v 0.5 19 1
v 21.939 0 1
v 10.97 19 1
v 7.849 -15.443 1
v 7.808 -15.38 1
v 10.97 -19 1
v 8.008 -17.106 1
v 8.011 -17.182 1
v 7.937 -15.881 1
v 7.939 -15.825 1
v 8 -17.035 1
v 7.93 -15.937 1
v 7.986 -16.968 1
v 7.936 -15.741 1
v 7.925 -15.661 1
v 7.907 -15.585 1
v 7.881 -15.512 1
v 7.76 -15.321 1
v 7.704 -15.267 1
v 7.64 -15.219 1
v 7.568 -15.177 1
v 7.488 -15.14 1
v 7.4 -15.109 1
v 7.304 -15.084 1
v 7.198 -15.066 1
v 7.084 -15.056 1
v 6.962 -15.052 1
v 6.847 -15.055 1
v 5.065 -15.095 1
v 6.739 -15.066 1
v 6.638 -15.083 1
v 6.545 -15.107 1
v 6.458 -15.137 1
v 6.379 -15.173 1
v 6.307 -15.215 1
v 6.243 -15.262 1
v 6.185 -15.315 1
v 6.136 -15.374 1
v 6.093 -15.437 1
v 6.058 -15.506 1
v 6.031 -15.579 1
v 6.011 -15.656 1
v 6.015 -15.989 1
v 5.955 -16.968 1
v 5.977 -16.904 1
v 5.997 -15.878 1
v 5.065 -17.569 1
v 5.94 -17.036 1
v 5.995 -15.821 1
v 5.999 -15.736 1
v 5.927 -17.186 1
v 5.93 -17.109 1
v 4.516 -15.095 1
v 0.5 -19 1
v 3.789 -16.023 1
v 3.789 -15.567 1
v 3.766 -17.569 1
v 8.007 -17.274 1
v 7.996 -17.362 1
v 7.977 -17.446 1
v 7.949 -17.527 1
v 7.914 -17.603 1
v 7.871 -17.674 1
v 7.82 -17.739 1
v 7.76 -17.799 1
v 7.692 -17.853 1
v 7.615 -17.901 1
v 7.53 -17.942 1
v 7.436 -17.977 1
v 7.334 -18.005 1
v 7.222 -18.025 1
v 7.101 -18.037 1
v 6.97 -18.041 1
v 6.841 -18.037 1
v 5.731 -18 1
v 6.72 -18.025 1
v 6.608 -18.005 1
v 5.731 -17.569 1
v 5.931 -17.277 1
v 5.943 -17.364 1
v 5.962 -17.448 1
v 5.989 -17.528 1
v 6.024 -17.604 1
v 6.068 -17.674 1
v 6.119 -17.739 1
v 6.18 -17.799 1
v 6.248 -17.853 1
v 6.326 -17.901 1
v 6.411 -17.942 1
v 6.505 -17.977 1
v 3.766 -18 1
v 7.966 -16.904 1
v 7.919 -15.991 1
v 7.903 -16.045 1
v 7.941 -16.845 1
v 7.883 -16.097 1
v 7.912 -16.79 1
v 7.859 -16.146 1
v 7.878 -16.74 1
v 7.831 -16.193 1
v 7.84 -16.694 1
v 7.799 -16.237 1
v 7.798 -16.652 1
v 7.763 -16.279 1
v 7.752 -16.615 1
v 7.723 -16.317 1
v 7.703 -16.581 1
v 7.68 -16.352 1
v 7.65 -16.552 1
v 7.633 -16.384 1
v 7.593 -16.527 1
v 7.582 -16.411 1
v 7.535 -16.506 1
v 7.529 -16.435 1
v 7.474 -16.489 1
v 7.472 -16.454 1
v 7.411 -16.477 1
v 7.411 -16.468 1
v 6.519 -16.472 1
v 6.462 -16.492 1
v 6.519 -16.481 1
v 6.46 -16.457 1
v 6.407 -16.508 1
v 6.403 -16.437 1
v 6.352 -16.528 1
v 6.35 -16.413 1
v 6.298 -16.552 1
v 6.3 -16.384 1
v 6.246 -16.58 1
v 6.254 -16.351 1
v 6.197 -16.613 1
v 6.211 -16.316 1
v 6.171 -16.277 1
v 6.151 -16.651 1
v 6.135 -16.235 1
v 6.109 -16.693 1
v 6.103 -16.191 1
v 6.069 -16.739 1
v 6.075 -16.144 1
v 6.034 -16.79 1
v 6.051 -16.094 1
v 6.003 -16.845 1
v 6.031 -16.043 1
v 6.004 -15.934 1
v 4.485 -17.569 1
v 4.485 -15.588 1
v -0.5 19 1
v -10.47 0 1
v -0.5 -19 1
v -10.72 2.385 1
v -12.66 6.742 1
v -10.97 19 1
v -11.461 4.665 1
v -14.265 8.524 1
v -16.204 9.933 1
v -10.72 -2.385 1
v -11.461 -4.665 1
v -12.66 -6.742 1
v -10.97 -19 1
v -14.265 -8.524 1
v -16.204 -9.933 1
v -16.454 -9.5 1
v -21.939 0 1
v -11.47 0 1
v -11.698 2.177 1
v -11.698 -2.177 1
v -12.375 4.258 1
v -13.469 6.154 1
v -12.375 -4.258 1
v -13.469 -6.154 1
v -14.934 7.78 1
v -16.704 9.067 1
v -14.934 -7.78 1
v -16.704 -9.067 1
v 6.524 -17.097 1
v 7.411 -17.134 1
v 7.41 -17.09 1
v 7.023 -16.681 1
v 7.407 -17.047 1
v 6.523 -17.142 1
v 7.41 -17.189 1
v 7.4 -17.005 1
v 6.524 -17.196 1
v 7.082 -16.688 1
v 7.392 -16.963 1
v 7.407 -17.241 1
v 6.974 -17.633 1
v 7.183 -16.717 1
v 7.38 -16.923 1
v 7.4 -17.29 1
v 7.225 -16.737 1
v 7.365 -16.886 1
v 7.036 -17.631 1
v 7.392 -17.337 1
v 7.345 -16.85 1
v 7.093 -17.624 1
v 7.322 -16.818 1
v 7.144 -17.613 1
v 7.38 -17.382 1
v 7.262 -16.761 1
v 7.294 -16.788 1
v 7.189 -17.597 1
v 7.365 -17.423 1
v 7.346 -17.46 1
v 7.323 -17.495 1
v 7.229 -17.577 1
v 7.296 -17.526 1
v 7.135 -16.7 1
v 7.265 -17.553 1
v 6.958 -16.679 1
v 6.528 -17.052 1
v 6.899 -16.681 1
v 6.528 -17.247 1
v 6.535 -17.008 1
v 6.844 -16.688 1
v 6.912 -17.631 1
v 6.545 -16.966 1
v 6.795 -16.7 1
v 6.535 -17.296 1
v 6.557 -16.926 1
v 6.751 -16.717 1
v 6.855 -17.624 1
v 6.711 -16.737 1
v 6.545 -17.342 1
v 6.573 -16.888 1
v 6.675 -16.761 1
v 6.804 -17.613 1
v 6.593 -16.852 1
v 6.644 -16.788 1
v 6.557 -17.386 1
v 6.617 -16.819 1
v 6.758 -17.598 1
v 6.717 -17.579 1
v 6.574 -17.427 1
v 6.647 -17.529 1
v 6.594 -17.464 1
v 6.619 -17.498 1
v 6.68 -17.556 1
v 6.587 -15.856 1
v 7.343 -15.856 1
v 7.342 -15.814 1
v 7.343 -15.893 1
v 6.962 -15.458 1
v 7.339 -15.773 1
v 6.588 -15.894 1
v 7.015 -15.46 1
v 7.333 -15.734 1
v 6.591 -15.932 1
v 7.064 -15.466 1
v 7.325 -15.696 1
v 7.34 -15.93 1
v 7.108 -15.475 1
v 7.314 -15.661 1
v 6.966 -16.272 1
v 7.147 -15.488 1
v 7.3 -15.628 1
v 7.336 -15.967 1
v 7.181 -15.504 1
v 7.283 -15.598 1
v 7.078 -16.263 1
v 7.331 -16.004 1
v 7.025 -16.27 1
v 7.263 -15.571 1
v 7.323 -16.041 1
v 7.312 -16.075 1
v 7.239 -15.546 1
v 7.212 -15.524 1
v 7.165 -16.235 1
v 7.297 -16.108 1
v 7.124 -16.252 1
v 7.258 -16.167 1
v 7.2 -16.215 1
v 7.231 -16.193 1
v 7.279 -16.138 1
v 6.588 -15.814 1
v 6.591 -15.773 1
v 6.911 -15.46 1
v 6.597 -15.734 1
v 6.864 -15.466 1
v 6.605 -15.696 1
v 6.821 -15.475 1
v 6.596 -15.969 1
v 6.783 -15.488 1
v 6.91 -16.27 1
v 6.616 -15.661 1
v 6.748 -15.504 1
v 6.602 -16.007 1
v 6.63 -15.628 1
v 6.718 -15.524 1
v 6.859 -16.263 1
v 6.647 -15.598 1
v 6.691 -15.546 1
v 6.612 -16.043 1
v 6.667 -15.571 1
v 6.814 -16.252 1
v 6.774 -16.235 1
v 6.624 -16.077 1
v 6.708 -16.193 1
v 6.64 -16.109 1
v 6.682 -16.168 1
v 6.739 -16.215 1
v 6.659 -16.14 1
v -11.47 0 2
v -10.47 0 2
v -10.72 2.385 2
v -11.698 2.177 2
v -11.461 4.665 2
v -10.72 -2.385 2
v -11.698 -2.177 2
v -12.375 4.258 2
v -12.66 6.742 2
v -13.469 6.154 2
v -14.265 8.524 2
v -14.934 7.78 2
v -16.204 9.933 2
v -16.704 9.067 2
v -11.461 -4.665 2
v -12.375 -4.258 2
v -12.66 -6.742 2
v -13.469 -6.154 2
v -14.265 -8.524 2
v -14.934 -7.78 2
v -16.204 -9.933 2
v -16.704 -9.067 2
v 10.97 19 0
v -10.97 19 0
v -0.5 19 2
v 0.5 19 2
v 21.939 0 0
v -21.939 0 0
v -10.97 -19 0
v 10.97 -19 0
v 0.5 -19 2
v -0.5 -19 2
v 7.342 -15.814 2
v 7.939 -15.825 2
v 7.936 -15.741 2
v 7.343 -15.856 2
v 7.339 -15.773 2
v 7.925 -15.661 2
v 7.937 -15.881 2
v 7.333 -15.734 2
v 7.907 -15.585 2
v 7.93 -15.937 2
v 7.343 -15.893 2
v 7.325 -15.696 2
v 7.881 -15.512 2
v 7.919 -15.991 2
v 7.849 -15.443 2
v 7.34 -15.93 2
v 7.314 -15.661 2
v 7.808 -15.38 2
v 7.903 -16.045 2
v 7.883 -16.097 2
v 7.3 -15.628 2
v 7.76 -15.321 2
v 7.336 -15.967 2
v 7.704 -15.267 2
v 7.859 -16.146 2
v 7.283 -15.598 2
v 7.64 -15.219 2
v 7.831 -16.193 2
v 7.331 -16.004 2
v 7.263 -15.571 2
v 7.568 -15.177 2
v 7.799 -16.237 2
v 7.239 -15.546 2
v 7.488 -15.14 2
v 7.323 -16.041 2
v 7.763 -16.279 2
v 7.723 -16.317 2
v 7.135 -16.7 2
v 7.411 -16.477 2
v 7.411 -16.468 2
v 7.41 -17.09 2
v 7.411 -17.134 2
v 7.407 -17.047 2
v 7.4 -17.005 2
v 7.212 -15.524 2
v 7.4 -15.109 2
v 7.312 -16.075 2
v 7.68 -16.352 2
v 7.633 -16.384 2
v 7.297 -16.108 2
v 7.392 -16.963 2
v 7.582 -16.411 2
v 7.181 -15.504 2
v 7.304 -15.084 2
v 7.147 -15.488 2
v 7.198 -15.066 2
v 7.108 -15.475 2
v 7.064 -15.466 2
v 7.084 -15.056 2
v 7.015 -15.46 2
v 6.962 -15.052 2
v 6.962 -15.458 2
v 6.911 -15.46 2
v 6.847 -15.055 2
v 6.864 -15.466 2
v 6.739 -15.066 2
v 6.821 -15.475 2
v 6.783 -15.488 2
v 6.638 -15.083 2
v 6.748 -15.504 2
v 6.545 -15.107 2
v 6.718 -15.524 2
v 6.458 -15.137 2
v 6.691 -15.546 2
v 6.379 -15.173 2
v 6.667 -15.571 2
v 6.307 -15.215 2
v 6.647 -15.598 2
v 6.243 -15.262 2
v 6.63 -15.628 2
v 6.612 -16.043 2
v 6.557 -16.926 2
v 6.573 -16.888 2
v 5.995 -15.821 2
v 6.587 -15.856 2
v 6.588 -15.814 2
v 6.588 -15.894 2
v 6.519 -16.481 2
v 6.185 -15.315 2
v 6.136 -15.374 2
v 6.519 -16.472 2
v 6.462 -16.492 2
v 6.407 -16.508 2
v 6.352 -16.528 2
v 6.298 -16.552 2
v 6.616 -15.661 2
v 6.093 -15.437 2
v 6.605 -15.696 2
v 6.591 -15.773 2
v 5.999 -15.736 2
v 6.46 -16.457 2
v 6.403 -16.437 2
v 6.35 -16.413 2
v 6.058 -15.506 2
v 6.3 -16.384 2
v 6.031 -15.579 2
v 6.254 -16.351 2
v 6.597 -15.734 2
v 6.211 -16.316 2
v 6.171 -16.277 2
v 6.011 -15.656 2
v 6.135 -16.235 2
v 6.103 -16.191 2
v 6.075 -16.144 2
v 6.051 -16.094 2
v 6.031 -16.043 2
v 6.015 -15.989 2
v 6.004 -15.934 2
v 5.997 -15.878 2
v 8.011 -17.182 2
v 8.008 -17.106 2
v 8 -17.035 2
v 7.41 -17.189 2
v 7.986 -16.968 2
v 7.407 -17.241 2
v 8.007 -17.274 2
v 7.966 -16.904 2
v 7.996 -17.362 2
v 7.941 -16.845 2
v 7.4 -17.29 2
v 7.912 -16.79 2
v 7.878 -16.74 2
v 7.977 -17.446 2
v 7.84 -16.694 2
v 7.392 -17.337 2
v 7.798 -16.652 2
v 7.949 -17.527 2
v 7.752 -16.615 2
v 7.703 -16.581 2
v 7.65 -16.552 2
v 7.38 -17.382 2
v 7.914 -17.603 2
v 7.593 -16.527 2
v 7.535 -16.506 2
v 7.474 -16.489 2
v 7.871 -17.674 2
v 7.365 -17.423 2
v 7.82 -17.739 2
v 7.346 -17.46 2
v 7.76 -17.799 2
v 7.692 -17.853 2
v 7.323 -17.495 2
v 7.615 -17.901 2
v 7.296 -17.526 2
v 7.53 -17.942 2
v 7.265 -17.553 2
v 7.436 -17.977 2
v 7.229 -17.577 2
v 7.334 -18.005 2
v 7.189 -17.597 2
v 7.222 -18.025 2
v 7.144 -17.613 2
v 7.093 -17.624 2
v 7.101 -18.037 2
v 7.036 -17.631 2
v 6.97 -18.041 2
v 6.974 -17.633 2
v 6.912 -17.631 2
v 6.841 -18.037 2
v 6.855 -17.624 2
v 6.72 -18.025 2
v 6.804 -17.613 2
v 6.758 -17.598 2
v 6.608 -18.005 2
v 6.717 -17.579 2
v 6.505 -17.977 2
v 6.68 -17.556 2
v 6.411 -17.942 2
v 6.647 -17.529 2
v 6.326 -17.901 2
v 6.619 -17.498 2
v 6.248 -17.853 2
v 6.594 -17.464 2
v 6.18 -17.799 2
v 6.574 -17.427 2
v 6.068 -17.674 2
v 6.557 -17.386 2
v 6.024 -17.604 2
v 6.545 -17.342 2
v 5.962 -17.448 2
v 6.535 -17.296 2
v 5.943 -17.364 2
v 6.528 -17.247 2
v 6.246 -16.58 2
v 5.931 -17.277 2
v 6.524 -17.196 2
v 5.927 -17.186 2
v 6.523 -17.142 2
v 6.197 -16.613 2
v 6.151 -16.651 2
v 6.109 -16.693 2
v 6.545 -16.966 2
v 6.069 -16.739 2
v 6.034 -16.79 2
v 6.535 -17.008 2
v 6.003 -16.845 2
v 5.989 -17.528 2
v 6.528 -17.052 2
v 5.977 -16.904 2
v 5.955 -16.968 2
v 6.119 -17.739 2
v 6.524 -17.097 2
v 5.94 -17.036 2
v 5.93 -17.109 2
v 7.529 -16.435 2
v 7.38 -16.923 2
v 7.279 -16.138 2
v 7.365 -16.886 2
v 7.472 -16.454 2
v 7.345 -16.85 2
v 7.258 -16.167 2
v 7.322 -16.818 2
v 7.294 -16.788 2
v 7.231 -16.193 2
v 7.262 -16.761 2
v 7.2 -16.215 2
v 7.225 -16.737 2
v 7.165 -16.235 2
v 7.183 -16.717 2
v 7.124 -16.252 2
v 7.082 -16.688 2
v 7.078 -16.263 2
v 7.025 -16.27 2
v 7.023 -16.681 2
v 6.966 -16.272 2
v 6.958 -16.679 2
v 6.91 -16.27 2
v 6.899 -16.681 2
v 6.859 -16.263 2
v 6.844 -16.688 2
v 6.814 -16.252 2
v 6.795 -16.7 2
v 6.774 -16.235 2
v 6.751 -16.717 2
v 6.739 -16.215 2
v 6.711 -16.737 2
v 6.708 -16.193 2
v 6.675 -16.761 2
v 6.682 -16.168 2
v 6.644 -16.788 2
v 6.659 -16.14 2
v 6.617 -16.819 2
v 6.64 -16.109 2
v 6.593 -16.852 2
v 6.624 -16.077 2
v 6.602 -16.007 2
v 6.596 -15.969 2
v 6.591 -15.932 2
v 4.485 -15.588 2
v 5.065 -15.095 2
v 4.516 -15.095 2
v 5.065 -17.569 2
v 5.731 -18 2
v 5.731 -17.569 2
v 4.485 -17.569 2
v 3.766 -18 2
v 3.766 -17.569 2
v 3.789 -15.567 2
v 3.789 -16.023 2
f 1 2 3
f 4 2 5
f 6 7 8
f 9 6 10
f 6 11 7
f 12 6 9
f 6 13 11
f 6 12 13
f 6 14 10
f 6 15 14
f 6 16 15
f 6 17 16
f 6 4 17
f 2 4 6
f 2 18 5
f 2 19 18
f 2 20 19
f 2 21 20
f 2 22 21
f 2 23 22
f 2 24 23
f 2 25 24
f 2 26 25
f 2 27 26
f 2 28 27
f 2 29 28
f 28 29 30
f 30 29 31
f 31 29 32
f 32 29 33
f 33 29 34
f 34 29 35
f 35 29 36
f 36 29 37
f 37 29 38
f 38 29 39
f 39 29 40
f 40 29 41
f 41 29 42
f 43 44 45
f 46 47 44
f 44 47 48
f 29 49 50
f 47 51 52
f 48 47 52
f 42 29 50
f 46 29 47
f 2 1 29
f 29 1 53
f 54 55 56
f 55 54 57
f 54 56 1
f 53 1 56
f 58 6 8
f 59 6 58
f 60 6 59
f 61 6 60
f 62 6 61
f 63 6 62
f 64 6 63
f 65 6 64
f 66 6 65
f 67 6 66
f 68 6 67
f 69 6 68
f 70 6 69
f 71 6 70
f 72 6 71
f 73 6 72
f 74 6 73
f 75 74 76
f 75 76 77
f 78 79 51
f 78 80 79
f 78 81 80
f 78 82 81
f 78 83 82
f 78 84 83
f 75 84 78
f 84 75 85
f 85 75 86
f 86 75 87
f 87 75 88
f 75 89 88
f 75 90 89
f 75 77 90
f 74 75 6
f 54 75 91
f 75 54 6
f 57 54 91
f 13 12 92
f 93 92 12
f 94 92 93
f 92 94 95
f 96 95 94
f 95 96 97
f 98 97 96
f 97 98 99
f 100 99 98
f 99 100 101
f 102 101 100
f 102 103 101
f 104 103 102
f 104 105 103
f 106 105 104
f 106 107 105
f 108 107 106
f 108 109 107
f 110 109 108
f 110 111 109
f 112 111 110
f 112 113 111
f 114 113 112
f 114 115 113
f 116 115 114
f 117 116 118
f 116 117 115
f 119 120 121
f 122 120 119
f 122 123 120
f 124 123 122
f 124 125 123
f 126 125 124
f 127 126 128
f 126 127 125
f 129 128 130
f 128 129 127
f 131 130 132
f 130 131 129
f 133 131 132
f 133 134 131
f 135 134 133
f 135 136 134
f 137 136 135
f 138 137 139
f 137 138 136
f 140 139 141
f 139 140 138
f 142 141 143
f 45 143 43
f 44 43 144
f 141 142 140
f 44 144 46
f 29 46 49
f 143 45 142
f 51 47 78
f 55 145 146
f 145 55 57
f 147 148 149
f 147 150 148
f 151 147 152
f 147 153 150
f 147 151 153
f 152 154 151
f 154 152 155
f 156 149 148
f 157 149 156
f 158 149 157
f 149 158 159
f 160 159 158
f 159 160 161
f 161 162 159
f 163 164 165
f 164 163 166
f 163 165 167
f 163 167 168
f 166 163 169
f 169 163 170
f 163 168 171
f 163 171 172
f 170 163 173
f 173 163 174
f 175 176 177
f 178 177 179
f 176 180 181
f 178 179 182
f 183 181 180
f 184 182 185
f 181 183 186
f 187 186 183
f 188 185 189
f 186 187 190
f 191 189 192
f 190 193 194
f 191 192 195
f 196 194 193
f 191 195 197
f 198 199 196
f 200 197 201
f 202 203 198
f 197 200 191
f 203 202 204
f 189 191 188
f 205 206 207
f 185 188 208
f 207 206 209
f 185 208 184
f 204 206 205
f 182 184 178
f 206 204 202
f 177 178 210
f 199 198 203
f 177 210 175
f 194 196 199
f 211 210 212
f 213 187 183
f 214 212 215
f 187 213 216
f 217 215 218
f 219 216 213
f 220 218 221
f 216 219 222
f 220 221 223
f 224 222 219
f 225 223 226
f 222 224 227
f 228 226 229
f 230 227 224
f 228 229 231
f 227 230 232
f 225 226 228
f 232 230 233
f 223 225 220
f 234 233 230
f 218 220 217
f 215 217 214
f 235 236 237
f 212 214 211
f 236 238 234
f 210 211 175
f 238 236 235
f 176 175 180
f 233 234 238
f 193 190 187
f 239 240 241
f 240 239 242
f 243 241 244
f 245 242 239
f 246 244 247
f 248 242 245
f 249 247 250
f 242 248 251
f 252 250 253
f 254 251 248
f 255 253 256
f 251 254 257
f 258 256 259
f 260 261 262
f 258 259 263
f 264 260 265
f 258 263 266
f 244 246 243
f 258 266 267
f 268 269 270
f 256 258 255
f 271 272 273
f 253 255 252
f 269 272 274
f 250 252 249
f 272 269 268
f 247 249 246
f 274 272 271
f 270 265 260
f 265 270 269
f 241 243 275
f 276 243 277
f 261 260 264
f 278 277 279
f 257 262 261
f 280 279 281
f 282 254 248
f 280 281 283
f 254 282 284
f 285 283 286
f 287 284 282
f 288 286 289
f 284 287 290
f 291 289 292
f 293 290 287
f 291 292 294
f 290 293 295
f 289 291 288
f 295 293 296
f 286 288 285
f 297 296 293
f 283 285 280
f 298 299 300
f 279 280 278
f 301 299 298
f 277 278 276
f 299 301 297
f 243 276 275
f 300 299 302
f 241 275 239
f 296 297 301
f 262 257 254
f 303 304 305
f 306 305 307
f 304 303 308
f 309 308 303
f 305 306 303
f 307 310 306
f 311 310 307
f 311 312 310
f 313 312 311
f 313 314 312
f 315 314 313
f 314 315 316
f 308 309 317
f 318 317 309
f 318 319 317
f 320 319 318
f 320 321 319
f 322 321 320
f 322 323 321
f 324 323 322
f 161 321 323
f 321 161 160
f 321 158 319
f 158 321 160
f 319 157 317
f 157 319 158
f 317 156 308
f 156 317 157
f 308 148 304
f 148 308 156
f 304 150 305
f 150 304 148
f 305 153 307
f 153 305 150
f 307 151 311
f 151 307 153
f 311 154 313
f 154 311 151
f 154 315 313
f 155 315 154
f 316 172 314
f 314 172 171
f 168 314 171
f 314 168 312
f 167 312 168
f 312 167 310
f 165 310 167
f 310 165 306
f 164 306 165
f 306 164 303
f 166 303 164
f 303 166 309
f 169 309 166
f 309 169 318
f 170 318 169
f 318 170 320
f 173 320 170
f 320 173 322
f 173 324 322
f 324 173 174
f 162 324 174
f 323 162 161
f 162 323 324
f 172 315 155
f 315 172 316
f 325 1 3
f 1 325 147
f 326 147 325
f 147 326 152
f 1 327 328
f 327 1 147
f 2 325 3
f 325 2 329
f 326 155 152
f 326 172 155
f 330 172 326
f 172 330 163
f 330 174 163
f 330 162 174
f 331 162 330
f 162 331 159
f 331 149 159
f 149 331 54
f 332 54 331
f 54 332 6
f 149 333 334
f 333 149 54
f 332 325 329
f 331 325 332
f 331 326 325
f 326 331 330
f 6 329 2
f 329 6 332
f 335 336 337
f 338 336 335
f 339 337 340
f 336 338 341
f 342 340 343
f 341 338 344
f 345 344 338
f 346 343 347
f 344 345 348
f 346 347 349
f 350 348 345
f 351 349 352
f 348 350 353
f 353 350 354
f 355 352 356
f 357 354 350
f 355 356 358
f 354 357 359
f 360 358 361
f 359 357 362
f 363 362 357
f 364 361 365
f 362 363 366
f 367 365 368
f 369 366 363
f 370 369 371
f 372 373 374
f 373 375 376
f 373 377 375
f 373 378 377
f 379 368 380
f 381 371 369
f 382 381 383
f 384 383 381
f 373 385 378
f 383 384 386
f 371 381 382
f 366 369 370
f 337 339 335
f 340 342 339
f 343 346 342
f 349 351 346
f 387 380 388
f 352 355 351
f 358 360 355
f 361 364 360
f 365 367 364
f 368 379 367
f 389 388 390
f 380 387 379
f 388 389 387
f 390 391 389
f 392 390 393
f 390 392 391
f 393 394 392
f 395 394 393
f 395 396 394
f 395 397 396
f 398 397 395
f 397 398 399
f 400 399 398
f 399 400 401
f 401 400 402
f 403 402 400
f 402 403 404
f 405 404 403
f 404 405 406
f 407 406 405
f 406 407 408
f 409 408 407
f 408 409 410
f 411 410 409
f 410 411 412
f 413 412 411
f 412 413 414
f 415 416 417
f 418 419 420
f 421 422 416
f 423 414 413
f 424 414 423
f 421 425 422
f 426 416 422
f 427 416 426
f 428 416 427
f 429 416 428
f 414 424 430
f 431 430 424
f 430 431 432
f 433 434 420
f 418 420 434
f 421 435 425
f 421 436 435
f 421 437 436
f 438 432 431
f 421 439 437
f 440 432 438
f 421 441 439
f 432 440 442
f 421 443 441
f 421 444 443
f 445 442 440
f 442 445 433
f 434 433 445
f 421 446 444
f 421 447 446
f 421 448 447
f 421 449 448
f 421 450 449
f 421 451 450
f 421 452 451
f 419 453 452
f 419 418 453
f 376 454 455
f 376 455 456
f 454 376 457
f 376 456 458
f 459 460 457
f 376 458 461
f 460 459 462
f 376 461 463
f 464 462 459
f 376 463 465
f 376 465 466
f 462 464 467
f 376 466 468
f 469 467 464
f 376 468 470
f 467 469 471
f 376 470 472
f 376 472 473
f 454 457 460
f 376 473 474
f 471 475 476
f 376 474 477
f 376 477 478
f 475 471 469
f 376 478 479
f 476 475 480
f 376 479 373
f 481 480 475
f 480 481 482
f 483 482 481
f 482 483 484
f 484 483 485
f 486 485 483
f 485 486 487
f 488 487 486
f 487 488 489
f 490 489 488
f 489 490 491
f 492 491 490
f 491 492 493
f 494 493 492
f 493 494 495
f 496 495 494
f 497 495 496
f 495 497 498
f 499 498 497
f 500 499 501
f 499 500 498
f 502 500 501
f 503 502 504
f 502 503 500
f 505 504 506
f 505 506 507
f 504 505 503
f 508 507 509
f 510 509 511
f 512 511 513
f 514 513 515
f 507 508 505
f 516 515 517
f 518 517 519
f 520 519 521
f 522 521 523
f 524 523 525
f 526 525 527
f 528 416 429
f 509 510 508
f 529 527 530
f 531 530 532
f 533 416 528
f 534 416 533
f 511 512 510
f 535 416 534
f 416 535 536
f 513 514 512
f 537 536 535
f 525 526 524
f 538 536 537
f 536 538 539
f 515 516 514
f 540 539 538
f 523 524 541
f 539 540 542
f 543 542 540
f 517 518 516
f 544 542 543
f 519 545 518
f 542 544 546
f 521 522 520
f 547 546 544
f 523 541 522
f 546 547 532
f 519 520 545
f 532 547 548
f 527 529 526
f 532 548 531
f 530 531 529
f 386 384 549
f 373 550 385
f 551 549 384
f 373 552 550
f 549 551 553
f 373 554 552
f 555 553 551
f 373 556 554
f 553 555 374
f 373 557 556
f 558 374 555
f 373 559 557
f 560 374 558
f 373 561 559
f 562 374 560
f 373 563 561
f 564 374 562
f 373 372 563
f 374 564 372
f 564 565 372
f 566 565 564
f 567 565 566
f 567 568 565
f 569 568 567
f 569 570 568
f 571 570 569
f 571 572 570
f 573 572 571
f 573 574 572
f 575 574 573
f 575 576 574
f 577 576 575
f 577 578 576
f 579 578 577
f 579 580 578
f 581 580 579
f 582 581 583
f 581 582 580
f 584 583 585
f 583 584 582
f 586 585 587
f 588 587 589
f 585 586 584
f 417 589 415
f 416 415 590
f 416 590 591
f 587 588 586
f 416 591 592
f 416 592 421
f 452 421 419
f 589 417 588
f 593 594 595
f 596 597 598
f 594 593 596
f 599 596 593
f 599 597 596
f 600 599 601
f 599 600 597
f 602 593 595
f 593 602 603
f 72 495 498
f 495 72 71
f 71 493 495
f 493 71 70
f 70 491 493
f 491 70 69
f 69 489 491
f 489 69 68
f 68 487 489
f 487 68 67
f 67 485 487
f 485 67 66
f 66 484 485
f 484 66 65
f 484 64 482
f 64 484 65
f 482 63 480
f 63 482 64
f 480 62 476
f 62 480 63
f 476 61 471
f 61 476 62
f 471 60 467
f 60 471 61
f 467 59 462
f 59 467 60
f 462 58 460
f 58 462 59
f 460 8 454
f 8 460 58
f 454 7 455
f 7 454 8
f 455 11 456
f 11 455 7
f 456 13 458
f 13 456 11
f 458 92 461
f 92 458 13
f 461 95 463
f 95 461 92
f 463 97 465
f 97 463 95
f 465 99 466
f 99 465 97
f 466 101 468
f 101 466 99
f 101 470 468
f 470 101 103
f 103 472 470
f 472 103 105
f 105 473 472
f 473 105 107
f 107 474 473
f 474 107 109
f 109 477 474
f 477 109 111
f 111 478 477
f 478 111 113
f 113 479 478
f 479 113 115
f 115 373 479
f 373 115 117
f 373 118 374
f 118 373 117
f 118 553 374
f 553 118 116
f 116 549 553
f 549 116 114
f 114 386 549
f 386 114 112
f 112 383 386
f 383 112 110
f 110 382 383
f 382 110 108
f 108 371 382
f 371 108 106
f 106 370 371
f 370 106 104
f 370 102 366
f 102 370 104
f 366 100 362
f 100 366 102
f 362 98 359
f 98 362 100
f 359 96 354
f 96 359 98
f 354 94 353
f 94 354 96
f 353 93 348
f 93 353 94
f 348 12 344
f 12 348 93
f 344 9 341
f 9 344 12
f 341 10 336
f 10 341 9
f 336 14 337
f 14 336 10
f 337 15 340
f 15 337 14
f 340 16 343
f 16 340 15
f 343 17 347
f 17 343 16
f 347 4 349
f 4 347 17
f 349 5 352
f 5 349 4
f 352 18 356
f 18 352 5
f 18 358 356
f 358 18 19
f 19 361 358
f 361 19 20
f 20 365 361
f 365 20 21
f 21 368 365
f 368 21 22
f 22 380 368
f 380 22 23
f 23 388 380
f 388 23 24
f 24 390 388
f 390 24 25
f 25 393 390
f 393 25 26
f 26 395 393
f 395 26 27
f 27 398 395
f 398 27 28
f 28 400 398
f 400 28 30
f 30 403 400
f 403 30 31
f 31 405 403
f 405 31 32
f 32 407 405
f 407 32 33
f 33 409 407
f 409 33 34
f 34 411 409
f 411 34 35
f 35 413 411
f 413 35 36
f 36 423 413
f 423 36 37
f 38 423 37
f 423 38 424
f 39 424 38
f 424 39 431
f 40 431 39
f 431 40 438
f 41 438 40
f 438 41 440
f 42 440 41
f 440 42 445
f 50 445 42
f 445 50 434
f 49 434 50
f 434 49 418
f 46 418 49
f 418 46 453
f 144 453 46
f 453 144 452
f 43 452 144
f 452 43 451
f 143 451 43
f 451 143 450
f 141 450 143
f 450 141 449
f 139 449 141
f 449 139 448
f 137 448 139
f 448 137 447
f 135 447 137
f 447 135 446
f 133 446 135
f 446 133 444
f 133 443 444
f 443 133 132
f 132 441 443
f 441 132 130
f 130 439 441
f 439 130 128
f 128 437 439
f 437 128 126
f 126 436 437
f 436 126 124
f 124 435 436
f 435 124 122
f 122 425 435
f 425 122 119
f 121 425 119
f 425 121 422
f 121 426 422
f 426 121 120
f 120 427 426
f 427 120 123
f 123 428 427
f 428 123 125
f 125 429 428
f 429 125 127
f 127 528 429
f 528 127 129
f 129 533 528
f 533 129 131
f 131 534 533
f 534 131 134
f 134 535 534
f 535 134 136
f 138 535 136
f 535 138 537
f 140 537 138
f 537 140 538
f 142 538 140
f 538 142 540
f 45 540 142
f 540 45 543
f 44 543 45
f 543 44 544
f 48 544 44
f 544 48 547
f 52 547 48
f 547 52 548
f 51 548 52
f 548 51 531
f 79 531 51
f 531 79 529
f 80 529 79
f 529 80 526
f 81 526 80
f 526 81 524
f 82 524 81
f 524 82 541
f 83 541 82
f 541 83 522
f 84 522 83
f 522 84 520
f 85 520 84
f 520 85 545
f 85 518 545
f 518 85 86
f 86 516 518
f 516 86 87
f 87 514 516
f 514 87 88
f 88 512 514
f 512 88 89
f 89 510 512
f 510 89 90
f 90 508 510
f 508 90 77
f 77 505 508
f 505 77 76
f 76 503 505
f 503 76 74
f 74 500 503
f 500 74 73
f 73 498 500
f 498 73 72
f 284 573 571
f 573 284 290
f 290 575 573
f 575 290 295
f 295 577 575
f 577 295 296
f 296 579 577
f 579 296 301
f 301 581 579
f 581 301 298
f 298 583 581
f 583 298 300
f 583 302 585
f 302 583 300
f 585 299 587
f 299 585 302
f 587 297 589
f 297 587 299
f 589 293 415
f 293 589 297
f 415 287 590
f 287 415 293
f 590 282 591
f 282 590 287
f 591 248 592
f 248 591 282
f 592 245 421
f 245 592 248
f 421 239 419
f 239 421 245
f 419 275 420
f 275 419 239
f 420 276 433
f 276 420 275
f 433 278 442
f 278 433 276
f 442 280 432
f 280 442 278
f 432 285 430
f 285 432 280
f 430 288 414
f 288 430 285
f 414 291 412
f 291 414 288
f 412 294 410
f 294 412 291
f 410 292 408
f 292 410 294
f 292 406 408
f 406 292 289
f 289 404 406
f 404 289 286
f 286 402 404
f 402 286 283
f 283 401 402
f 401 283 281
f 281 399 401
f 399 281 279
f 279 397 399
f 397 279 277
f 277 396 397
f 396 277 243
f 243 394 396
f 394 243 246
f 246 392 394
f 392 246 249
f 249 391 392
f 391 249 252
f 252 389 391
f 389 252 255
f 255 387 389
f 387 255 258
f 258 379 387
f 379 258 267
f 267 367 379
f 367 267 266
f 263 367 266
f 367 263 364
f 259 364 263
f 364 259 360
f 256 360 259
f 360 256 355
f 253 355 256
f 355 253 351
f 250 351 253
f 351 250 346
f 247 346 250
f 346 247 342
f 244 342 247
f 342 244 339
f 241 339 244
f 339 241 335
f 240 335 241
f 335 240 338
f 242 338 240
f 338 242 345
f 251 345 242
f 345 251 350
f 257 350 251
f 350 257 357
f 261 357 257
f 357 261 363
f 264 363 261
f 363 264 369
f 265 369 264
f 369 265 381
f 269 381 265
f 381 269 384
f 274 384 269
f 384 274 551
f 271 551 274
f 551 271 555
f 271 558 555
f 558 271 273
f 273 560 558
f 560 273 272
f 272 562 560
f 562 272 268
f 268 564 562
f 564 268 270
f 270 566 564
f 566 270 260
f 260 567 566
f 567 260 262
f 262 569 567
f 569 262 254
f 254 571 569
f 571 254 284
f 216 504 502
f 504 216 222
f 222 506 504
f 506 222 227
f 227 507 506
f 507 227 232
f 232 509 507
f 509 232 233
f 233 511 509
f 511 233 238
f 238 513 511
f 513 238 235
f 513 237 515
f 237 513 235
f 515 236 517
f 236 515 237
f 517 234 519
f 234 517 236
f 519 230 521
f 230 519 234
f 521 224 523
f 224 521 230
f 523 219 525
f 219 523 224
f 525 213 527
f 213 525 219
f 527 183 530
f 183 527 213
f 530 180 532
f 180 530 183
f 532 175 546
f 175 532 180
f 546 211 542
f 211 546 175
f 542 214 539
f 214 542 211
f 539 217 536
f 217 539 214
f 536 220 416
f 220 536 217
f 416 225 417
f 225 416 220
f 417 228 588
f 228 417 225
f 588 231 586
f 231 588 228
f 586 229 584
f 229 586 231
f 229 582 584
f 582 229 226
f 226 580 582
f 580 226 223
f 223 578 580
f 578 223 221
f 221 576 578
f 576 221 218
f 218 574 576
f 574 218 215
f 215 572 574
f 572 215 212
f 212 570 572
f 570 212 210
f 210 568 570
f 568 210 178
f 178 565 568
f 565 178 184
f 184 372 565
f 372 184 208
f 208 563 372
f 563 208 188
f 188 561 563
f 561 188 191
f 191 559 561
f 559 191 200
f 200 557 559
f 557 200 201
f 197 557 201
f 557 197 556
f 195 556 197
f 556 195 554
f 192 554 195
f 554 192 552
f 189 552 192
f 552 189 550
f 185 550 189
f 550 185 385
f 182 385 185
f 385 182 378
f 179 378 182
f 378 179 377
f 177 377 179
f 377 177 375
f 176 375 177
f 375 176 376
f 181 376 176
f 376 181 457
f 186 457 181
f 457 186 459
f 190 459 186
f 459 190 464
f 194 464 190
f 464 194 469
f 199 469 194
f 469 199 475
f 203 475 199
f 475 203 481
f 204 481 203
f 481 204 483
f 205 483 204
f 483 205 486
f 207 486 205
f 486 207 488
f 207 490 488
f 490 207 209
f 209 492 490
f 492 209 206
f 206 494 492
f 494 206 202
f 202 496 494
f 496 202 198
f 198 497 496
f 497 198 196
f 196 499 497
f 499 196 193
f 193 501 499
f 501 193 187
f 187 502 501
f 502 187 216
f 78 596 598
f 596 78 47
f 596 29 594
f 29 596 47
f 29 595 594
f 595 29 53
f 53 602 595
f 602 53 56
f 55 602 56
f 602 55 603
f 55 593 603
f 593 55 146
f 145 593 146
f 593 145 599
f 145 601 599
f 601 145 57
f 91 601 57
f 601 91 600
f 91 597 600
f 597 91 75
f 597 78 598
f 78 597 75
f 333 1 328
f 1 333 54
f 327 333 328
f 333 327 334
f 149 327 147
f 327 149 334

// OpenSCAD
include <../Scripts/18xx tiles basic functions.scad>
hex("Green");
put_tilenr("18");
straight_line(r=0);
sharp_curve(r=4);
